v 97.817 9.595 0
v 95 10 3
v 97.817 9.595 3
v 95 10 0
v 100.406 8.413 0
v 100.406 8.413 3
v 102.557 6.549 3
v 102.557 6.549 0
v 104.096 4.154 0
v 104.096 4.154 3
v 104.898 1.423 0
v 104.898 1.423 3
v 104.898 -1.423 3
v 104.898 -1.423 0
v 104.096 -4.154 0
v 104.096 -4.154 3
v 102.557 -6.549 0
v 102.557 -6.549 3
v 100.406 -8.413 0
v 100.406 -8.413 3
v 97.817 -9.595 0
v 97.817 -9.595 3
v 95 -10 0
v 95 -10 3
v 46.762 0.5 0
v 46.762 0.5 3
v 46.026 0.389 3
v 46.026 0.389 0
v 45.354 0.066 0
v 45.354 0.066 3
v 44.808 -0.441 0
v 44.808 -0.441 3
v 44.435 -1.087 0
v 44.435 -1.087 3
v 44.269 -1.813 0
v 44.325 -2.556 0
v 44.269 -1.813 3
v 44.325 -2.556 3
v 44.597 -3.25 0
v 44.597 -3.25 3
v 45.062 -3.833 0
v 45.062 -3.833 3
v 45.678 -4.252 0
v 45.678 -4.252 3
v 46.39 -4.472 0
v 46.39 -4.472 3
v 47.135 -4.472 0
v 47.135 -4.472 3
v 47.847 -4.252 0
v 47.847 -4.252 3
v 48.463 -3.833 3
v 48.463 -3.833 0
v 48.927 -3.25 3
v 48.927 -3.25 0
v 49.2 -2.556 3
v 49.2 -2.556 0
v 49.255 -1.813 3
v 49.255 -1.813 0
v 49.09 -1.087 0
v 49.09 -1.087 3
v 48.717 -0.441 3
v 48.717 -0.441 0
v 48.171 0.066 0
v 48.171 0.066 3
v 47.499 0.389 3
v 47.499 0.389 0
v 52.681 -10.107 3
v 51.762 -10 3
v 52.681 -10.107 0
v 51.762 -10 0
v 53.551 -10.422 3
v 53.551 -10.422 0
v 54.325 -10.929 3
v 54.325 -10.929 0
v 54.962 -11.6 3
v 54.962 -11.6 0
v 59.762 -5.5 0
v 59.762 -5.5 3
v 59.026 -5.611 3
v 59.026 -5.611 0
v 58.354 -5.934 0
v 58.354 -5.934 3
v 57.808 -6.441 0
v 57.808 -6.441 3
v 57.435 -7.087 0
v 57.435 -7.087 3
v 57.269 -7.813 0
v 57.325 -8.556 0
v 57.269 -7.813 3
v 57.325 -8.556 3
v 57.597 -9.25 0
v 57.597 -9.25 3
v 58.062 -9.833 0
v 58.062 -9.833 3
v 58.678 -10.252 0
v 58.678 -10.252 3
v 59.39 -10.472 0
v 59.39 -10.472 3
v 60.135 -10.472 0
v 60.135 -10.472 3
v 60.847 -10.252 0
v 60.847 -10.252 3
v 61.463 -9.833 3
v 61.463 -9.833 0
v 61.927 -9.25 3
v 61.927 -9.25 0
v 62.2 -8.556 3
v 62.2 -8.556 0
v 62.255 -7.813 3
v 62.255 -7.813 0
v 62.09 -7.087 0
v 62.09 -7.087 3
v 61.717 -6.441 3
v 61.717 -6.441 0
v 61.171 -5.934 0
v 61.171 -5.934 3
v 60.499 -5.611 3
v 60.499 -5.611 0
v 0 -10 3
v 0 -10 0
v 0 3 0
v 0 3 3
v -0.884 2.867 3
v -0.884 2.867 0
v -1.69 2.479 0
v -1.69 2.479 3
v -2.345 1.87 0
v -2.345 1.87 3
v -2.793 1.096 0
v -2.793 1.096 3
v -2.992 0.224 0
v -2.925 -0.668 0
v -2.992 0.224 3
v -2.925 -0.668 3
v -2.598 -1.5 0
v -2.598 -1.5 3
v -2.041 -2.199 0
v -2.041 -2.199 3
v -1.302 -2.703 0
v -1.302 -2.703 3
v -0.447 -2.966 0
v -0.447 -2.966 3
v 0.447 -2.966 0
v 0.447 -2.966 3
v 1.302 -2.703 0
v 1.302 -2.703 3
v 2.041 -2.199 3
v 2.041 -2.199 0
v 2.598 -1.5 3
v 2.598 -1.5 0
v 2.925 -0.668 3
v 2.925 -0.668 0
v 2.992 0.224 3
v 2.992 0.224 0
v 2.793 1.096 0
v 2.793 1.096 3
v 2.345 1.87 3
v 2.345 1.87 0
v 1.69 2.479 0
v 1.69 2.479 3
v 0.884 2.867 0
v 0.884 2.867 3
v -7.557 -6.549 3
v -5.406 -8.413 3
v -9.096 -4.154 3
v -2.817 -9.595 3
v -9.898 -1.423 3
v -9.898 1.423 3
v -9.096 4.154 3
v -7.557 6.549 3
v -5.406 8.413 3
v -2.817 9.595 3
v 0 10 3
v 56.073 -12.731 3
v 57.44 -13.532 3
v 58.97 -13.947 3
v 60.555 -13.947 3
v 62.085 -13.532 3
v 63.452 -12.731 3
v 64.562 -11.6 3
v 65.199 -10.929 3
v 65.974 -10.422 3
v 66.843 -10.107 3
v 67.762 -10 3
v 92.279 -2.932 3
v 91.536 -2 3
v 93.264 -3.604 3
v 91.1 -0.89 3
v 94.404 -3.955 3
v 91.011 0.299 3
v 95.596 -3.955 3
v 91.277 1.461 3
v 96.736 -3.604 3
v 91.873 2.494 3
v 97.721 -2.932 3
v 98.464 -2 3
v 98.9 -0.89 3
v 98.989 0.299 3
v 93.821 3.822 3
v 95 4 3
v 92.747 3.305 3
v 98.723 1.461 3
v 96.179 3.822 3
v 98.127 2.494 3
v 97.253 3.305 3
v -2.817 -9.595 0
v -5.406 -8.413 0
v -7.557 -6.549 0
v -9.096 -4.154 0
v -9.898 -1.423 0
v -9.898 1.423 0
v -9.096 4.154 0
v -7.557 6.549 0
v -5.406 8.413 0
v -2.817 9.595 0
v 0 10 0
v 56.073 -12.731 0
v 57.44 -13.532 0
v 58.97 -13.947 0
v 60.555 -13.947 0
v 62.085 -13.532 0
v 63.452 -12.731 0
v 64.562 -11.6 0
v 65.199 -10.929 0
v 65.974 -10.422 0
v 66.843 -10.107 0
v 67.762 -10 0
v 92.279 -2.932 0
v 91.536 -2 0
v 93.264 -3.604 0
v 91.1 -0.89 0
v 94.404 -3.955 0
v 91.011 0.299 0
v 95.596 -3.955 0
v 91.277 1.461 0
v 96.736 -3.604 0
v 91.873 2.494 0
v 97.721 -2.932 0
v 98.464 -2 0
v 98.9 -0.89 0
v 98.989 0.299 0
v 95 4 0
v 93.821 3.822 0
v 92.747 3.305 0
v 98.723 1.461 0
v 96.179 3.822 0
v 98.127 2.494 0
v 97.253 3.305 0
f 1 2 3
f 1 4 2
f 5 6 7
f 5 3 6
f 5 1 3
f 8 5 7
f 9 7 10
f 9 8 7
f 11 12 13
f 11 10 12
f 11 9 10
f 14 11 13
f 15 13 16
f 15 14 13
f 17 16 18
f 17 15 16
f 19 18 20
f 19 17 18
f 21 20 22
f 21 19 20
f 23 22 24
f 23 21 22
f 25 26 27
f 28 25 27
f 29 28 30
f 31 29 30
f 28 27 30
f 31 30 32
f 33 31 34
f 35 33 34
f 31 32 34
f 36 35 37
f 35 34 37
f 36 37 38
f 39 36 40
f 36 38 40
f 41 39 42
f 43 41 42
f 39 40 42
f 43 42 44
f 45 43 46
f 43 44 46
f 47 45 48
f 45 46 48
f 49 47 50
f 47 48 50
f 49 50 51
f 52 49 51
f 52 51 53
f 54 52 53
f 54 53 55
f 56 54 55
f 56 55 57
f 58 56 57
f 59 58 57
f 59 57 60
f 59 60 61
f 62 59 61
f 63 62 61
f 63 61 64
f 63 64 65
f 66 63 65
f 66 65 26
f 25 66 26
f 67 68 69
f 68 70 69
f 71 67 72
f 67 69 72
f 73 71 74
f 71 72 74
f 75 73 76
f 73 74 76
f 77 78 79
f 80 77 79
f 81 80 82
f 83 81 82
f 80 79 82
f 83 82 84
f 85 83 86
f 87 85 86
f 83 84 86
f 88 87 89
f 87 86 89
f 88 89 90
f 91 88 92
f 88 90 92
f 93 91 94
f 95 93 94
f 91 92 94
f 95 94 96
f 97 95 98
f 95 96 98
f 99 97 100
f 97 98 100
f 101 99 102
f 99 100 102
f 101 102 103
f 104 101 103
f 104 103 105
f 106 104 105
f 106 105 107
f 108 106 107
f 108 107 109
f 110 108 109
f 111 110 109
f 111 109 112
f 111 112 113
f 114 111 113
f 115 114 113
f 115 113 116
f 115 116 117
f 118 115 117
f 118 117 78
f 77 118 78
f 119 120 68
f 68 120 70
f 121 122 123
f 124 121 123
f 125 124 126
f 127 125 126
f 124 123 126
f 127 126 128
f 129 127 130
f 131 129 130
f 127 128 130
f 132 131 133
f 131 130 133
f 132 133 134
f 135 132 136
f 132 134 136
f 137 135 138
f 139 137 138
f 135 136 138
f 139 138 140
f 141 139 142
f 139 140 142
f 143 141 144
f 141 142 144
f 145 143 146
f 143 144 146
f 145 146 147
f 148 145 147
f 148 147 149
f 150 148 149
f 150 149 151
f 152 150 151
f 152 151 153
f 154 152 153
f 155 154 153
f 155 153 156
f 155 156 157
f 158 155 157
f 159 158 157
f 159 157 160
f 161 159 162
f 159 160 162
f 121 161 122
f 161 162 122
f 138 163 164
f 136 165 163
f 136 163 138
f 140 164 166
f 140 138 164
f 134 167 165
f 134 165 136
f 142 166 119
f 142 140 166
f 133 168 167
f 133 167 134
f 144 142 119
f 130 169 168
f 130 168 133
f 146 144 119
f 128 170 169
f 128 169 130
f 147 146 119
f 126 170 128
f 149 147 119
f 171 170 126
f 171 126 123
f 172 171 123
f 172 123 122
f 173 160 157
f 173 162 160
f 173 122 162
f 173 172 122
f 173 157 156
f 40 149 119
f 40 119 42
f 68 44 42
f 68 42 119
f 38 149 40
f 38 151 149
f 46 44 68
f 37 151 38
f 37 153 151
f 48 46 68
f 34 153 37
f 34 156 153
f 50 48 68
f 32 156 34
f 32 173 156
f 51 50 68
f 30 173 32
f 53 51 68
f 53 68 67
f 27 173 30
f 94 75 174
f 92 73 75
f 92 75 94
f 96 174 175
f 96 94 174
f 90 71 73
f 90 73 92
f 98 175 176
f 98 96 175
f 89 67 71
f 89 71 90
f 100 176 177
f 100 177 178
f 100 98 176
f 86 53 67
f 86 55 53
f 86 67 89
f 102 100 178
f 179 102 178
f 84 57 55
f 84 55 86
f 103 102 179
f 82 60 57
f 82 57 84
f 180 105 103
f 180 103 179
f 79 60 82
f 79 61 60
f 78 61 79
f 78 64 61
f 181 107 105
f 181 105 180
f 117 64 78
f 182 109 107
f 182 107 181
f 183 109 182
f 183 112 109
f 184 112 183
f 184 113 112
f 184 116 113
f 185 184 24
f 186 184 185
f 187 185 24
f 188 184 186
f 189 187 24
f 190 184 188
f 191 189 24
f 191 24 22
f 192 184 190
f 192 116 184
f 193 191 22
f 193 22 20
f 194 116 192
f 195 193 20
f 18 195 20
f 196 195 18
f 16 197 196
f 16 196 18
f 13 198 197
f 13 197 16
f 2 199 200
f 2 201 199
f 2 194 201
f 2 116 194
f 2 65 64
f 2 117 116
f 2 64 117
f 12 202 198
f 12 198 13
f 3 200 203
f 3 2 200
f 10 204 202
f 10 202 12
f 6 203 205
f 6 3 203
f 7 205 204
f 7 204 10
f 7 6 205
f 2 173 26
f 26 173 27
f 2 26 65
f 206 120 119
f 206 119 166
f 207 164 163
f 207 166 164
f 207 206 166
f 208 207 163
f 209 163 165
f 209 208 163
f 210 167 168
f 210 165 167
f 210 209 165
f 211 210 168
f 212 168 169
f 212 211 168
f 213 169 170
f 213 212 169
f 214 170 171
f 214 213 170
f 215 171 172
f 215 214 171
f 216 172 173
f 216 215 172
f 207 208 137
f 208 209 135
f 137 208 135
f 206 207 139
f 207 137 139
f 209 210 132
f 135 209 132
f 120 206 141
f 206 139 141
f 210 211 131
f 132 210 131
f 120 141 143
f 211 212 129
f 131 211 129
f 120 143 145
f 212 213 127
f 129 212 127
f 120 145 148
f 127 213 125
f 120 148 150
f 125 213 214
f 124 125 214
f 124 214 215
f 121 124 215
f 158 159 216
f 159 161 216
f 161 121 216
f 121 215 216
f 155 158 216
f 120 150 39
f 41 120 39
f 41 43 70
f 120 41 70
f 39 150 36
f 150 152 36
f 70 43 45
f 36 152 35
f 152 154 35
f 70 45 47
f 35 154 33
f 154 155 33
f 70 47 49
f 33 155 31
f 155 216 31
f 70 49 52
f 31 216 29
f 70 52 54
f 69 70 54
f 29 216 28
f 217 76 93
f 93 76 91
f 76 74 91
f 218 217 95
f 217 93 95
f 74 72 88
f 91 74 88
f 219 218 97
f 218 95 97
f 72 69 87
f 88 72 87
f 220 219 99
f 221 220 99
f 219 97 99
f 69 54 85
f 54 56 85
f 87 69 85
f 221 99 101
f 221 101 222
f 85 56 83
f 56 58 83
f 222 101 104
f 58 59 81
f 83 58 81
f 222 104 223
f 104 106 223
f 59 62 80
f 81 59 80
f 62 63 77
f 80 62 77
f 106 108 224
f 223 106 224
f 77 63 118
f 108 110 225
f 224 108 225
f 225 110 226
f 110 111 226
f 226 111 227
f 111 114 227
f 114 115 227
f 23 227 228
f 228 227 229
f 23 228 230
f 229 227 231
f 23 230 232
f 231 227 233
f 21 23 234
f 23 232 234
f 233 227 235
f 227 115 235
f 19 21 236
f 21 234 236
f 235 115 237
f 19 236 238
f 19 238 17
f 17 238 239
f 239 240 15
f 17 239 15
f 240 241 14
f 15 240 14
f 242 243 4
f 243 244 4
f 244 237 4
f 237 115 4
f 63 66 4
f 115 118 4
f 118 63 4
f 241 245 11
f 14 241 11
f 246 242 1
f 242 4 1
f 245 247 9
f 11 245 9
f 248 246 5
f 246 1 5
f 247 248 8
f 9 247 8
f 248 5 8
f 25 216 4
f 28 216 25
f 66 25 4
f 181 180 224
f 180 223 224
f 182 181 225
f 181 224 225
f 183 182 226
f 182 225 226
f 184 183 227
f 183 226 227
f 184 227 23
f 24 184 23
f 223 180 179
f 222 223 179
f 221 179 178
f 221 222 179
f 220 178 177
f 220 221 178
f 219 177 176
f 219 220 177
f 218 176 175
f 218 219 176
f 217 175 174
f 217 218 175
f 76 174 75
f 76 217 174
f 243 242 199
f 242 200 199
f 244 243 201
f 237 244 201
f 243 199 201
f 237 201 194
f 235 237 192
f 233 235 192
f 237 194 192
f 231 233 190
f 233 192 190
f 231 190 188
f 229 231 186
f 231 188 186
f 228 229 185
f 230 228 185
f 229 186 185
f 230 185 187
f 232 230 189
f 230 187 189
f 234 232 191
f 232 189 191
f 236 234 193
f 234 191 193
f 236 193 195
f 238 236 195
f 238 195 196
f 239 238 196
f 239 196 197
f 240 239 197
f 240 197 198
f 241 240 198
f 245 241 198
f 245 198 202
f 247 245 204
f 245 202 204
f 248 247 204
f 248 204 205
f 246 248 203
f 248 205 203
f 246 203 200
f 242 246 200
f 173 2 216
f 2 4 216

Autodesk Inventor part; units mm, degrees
ref_plane "YZ Plane" through (0, 0, 0) normal (1, 0, 0) x (0, 1, 0)
ref_plane "XZ Plane" through (0, 0, 0) normal (0, 1, 0) x (-1, 0, 0)
ref_plane "XY Plane" through (0, 0, 0) normal (0, 0, 1) x (1, 0, 0)
sketch "Szkic1" plane through (0, 0, 0) normal (0, 0, 1) x (1, 0, 0)
  line L0 (0, 0) -> (95, 0) construction
  line L1 (0, -10) -> (5.8348, -10)
  line L2 (95, 10) -> (0, 10)
  arc A0 (0, 10) -> (0, -10) centre (0, 0) ccw
  arc A1 (95, -10) -> (95, 10) centre (95, 0) ccw
  line L3 (5.8348, -10) -> (51.7624, -10)
  arc A2 (54.9624, -11.6) -> (64.5624, -11.6) centre (59.7624, -8) ccw
  line L4 (67.7624, -10) -> (95, -10)
  arc A3 (54.9624, -11.6) -> (51.7624, -10) centre (51.7624, -14) ccw
  arc A4 (67.7624, -10) -> (64.5624, -11.6) centre (67.7624, -14) ccw
  point P0 (47.5, 0)
  point P1 (46.7624, -2)
  point P2 (65.4193, -10)
  point P3 (54.1056, -10)
  point P4 (54.7624, -1)
  dimension "d0" = 95
  dimension "d1" = 20
  dimension "d23" = 12
  dimension "d24" = 4
  dimension "d34" = 8
  dimension "d35" = 5
  dimension "d36" = 7
  dimension "d37" = 1
  dimension "d38" = 6
  dimension "d40" = 40.25
  dimension "d41" = 1
extrude "Wyciągnięcie proste1" add sketch "Szkic1" along normal blind 3
hole "Otwór1" at (95, 0, 0) direction (0, 0, 1) diameter 8 end through all
hole "Otwór2" at (46.7624, -2, 0) at (59.7624, -8, 0) direction (0, 0, 1) diameter 5 end through all
hole "Otwór3" at (0, 0, 0) direction (0, 0, 1) diameter 6 end through all
properties part number "ramie_napinacza"
